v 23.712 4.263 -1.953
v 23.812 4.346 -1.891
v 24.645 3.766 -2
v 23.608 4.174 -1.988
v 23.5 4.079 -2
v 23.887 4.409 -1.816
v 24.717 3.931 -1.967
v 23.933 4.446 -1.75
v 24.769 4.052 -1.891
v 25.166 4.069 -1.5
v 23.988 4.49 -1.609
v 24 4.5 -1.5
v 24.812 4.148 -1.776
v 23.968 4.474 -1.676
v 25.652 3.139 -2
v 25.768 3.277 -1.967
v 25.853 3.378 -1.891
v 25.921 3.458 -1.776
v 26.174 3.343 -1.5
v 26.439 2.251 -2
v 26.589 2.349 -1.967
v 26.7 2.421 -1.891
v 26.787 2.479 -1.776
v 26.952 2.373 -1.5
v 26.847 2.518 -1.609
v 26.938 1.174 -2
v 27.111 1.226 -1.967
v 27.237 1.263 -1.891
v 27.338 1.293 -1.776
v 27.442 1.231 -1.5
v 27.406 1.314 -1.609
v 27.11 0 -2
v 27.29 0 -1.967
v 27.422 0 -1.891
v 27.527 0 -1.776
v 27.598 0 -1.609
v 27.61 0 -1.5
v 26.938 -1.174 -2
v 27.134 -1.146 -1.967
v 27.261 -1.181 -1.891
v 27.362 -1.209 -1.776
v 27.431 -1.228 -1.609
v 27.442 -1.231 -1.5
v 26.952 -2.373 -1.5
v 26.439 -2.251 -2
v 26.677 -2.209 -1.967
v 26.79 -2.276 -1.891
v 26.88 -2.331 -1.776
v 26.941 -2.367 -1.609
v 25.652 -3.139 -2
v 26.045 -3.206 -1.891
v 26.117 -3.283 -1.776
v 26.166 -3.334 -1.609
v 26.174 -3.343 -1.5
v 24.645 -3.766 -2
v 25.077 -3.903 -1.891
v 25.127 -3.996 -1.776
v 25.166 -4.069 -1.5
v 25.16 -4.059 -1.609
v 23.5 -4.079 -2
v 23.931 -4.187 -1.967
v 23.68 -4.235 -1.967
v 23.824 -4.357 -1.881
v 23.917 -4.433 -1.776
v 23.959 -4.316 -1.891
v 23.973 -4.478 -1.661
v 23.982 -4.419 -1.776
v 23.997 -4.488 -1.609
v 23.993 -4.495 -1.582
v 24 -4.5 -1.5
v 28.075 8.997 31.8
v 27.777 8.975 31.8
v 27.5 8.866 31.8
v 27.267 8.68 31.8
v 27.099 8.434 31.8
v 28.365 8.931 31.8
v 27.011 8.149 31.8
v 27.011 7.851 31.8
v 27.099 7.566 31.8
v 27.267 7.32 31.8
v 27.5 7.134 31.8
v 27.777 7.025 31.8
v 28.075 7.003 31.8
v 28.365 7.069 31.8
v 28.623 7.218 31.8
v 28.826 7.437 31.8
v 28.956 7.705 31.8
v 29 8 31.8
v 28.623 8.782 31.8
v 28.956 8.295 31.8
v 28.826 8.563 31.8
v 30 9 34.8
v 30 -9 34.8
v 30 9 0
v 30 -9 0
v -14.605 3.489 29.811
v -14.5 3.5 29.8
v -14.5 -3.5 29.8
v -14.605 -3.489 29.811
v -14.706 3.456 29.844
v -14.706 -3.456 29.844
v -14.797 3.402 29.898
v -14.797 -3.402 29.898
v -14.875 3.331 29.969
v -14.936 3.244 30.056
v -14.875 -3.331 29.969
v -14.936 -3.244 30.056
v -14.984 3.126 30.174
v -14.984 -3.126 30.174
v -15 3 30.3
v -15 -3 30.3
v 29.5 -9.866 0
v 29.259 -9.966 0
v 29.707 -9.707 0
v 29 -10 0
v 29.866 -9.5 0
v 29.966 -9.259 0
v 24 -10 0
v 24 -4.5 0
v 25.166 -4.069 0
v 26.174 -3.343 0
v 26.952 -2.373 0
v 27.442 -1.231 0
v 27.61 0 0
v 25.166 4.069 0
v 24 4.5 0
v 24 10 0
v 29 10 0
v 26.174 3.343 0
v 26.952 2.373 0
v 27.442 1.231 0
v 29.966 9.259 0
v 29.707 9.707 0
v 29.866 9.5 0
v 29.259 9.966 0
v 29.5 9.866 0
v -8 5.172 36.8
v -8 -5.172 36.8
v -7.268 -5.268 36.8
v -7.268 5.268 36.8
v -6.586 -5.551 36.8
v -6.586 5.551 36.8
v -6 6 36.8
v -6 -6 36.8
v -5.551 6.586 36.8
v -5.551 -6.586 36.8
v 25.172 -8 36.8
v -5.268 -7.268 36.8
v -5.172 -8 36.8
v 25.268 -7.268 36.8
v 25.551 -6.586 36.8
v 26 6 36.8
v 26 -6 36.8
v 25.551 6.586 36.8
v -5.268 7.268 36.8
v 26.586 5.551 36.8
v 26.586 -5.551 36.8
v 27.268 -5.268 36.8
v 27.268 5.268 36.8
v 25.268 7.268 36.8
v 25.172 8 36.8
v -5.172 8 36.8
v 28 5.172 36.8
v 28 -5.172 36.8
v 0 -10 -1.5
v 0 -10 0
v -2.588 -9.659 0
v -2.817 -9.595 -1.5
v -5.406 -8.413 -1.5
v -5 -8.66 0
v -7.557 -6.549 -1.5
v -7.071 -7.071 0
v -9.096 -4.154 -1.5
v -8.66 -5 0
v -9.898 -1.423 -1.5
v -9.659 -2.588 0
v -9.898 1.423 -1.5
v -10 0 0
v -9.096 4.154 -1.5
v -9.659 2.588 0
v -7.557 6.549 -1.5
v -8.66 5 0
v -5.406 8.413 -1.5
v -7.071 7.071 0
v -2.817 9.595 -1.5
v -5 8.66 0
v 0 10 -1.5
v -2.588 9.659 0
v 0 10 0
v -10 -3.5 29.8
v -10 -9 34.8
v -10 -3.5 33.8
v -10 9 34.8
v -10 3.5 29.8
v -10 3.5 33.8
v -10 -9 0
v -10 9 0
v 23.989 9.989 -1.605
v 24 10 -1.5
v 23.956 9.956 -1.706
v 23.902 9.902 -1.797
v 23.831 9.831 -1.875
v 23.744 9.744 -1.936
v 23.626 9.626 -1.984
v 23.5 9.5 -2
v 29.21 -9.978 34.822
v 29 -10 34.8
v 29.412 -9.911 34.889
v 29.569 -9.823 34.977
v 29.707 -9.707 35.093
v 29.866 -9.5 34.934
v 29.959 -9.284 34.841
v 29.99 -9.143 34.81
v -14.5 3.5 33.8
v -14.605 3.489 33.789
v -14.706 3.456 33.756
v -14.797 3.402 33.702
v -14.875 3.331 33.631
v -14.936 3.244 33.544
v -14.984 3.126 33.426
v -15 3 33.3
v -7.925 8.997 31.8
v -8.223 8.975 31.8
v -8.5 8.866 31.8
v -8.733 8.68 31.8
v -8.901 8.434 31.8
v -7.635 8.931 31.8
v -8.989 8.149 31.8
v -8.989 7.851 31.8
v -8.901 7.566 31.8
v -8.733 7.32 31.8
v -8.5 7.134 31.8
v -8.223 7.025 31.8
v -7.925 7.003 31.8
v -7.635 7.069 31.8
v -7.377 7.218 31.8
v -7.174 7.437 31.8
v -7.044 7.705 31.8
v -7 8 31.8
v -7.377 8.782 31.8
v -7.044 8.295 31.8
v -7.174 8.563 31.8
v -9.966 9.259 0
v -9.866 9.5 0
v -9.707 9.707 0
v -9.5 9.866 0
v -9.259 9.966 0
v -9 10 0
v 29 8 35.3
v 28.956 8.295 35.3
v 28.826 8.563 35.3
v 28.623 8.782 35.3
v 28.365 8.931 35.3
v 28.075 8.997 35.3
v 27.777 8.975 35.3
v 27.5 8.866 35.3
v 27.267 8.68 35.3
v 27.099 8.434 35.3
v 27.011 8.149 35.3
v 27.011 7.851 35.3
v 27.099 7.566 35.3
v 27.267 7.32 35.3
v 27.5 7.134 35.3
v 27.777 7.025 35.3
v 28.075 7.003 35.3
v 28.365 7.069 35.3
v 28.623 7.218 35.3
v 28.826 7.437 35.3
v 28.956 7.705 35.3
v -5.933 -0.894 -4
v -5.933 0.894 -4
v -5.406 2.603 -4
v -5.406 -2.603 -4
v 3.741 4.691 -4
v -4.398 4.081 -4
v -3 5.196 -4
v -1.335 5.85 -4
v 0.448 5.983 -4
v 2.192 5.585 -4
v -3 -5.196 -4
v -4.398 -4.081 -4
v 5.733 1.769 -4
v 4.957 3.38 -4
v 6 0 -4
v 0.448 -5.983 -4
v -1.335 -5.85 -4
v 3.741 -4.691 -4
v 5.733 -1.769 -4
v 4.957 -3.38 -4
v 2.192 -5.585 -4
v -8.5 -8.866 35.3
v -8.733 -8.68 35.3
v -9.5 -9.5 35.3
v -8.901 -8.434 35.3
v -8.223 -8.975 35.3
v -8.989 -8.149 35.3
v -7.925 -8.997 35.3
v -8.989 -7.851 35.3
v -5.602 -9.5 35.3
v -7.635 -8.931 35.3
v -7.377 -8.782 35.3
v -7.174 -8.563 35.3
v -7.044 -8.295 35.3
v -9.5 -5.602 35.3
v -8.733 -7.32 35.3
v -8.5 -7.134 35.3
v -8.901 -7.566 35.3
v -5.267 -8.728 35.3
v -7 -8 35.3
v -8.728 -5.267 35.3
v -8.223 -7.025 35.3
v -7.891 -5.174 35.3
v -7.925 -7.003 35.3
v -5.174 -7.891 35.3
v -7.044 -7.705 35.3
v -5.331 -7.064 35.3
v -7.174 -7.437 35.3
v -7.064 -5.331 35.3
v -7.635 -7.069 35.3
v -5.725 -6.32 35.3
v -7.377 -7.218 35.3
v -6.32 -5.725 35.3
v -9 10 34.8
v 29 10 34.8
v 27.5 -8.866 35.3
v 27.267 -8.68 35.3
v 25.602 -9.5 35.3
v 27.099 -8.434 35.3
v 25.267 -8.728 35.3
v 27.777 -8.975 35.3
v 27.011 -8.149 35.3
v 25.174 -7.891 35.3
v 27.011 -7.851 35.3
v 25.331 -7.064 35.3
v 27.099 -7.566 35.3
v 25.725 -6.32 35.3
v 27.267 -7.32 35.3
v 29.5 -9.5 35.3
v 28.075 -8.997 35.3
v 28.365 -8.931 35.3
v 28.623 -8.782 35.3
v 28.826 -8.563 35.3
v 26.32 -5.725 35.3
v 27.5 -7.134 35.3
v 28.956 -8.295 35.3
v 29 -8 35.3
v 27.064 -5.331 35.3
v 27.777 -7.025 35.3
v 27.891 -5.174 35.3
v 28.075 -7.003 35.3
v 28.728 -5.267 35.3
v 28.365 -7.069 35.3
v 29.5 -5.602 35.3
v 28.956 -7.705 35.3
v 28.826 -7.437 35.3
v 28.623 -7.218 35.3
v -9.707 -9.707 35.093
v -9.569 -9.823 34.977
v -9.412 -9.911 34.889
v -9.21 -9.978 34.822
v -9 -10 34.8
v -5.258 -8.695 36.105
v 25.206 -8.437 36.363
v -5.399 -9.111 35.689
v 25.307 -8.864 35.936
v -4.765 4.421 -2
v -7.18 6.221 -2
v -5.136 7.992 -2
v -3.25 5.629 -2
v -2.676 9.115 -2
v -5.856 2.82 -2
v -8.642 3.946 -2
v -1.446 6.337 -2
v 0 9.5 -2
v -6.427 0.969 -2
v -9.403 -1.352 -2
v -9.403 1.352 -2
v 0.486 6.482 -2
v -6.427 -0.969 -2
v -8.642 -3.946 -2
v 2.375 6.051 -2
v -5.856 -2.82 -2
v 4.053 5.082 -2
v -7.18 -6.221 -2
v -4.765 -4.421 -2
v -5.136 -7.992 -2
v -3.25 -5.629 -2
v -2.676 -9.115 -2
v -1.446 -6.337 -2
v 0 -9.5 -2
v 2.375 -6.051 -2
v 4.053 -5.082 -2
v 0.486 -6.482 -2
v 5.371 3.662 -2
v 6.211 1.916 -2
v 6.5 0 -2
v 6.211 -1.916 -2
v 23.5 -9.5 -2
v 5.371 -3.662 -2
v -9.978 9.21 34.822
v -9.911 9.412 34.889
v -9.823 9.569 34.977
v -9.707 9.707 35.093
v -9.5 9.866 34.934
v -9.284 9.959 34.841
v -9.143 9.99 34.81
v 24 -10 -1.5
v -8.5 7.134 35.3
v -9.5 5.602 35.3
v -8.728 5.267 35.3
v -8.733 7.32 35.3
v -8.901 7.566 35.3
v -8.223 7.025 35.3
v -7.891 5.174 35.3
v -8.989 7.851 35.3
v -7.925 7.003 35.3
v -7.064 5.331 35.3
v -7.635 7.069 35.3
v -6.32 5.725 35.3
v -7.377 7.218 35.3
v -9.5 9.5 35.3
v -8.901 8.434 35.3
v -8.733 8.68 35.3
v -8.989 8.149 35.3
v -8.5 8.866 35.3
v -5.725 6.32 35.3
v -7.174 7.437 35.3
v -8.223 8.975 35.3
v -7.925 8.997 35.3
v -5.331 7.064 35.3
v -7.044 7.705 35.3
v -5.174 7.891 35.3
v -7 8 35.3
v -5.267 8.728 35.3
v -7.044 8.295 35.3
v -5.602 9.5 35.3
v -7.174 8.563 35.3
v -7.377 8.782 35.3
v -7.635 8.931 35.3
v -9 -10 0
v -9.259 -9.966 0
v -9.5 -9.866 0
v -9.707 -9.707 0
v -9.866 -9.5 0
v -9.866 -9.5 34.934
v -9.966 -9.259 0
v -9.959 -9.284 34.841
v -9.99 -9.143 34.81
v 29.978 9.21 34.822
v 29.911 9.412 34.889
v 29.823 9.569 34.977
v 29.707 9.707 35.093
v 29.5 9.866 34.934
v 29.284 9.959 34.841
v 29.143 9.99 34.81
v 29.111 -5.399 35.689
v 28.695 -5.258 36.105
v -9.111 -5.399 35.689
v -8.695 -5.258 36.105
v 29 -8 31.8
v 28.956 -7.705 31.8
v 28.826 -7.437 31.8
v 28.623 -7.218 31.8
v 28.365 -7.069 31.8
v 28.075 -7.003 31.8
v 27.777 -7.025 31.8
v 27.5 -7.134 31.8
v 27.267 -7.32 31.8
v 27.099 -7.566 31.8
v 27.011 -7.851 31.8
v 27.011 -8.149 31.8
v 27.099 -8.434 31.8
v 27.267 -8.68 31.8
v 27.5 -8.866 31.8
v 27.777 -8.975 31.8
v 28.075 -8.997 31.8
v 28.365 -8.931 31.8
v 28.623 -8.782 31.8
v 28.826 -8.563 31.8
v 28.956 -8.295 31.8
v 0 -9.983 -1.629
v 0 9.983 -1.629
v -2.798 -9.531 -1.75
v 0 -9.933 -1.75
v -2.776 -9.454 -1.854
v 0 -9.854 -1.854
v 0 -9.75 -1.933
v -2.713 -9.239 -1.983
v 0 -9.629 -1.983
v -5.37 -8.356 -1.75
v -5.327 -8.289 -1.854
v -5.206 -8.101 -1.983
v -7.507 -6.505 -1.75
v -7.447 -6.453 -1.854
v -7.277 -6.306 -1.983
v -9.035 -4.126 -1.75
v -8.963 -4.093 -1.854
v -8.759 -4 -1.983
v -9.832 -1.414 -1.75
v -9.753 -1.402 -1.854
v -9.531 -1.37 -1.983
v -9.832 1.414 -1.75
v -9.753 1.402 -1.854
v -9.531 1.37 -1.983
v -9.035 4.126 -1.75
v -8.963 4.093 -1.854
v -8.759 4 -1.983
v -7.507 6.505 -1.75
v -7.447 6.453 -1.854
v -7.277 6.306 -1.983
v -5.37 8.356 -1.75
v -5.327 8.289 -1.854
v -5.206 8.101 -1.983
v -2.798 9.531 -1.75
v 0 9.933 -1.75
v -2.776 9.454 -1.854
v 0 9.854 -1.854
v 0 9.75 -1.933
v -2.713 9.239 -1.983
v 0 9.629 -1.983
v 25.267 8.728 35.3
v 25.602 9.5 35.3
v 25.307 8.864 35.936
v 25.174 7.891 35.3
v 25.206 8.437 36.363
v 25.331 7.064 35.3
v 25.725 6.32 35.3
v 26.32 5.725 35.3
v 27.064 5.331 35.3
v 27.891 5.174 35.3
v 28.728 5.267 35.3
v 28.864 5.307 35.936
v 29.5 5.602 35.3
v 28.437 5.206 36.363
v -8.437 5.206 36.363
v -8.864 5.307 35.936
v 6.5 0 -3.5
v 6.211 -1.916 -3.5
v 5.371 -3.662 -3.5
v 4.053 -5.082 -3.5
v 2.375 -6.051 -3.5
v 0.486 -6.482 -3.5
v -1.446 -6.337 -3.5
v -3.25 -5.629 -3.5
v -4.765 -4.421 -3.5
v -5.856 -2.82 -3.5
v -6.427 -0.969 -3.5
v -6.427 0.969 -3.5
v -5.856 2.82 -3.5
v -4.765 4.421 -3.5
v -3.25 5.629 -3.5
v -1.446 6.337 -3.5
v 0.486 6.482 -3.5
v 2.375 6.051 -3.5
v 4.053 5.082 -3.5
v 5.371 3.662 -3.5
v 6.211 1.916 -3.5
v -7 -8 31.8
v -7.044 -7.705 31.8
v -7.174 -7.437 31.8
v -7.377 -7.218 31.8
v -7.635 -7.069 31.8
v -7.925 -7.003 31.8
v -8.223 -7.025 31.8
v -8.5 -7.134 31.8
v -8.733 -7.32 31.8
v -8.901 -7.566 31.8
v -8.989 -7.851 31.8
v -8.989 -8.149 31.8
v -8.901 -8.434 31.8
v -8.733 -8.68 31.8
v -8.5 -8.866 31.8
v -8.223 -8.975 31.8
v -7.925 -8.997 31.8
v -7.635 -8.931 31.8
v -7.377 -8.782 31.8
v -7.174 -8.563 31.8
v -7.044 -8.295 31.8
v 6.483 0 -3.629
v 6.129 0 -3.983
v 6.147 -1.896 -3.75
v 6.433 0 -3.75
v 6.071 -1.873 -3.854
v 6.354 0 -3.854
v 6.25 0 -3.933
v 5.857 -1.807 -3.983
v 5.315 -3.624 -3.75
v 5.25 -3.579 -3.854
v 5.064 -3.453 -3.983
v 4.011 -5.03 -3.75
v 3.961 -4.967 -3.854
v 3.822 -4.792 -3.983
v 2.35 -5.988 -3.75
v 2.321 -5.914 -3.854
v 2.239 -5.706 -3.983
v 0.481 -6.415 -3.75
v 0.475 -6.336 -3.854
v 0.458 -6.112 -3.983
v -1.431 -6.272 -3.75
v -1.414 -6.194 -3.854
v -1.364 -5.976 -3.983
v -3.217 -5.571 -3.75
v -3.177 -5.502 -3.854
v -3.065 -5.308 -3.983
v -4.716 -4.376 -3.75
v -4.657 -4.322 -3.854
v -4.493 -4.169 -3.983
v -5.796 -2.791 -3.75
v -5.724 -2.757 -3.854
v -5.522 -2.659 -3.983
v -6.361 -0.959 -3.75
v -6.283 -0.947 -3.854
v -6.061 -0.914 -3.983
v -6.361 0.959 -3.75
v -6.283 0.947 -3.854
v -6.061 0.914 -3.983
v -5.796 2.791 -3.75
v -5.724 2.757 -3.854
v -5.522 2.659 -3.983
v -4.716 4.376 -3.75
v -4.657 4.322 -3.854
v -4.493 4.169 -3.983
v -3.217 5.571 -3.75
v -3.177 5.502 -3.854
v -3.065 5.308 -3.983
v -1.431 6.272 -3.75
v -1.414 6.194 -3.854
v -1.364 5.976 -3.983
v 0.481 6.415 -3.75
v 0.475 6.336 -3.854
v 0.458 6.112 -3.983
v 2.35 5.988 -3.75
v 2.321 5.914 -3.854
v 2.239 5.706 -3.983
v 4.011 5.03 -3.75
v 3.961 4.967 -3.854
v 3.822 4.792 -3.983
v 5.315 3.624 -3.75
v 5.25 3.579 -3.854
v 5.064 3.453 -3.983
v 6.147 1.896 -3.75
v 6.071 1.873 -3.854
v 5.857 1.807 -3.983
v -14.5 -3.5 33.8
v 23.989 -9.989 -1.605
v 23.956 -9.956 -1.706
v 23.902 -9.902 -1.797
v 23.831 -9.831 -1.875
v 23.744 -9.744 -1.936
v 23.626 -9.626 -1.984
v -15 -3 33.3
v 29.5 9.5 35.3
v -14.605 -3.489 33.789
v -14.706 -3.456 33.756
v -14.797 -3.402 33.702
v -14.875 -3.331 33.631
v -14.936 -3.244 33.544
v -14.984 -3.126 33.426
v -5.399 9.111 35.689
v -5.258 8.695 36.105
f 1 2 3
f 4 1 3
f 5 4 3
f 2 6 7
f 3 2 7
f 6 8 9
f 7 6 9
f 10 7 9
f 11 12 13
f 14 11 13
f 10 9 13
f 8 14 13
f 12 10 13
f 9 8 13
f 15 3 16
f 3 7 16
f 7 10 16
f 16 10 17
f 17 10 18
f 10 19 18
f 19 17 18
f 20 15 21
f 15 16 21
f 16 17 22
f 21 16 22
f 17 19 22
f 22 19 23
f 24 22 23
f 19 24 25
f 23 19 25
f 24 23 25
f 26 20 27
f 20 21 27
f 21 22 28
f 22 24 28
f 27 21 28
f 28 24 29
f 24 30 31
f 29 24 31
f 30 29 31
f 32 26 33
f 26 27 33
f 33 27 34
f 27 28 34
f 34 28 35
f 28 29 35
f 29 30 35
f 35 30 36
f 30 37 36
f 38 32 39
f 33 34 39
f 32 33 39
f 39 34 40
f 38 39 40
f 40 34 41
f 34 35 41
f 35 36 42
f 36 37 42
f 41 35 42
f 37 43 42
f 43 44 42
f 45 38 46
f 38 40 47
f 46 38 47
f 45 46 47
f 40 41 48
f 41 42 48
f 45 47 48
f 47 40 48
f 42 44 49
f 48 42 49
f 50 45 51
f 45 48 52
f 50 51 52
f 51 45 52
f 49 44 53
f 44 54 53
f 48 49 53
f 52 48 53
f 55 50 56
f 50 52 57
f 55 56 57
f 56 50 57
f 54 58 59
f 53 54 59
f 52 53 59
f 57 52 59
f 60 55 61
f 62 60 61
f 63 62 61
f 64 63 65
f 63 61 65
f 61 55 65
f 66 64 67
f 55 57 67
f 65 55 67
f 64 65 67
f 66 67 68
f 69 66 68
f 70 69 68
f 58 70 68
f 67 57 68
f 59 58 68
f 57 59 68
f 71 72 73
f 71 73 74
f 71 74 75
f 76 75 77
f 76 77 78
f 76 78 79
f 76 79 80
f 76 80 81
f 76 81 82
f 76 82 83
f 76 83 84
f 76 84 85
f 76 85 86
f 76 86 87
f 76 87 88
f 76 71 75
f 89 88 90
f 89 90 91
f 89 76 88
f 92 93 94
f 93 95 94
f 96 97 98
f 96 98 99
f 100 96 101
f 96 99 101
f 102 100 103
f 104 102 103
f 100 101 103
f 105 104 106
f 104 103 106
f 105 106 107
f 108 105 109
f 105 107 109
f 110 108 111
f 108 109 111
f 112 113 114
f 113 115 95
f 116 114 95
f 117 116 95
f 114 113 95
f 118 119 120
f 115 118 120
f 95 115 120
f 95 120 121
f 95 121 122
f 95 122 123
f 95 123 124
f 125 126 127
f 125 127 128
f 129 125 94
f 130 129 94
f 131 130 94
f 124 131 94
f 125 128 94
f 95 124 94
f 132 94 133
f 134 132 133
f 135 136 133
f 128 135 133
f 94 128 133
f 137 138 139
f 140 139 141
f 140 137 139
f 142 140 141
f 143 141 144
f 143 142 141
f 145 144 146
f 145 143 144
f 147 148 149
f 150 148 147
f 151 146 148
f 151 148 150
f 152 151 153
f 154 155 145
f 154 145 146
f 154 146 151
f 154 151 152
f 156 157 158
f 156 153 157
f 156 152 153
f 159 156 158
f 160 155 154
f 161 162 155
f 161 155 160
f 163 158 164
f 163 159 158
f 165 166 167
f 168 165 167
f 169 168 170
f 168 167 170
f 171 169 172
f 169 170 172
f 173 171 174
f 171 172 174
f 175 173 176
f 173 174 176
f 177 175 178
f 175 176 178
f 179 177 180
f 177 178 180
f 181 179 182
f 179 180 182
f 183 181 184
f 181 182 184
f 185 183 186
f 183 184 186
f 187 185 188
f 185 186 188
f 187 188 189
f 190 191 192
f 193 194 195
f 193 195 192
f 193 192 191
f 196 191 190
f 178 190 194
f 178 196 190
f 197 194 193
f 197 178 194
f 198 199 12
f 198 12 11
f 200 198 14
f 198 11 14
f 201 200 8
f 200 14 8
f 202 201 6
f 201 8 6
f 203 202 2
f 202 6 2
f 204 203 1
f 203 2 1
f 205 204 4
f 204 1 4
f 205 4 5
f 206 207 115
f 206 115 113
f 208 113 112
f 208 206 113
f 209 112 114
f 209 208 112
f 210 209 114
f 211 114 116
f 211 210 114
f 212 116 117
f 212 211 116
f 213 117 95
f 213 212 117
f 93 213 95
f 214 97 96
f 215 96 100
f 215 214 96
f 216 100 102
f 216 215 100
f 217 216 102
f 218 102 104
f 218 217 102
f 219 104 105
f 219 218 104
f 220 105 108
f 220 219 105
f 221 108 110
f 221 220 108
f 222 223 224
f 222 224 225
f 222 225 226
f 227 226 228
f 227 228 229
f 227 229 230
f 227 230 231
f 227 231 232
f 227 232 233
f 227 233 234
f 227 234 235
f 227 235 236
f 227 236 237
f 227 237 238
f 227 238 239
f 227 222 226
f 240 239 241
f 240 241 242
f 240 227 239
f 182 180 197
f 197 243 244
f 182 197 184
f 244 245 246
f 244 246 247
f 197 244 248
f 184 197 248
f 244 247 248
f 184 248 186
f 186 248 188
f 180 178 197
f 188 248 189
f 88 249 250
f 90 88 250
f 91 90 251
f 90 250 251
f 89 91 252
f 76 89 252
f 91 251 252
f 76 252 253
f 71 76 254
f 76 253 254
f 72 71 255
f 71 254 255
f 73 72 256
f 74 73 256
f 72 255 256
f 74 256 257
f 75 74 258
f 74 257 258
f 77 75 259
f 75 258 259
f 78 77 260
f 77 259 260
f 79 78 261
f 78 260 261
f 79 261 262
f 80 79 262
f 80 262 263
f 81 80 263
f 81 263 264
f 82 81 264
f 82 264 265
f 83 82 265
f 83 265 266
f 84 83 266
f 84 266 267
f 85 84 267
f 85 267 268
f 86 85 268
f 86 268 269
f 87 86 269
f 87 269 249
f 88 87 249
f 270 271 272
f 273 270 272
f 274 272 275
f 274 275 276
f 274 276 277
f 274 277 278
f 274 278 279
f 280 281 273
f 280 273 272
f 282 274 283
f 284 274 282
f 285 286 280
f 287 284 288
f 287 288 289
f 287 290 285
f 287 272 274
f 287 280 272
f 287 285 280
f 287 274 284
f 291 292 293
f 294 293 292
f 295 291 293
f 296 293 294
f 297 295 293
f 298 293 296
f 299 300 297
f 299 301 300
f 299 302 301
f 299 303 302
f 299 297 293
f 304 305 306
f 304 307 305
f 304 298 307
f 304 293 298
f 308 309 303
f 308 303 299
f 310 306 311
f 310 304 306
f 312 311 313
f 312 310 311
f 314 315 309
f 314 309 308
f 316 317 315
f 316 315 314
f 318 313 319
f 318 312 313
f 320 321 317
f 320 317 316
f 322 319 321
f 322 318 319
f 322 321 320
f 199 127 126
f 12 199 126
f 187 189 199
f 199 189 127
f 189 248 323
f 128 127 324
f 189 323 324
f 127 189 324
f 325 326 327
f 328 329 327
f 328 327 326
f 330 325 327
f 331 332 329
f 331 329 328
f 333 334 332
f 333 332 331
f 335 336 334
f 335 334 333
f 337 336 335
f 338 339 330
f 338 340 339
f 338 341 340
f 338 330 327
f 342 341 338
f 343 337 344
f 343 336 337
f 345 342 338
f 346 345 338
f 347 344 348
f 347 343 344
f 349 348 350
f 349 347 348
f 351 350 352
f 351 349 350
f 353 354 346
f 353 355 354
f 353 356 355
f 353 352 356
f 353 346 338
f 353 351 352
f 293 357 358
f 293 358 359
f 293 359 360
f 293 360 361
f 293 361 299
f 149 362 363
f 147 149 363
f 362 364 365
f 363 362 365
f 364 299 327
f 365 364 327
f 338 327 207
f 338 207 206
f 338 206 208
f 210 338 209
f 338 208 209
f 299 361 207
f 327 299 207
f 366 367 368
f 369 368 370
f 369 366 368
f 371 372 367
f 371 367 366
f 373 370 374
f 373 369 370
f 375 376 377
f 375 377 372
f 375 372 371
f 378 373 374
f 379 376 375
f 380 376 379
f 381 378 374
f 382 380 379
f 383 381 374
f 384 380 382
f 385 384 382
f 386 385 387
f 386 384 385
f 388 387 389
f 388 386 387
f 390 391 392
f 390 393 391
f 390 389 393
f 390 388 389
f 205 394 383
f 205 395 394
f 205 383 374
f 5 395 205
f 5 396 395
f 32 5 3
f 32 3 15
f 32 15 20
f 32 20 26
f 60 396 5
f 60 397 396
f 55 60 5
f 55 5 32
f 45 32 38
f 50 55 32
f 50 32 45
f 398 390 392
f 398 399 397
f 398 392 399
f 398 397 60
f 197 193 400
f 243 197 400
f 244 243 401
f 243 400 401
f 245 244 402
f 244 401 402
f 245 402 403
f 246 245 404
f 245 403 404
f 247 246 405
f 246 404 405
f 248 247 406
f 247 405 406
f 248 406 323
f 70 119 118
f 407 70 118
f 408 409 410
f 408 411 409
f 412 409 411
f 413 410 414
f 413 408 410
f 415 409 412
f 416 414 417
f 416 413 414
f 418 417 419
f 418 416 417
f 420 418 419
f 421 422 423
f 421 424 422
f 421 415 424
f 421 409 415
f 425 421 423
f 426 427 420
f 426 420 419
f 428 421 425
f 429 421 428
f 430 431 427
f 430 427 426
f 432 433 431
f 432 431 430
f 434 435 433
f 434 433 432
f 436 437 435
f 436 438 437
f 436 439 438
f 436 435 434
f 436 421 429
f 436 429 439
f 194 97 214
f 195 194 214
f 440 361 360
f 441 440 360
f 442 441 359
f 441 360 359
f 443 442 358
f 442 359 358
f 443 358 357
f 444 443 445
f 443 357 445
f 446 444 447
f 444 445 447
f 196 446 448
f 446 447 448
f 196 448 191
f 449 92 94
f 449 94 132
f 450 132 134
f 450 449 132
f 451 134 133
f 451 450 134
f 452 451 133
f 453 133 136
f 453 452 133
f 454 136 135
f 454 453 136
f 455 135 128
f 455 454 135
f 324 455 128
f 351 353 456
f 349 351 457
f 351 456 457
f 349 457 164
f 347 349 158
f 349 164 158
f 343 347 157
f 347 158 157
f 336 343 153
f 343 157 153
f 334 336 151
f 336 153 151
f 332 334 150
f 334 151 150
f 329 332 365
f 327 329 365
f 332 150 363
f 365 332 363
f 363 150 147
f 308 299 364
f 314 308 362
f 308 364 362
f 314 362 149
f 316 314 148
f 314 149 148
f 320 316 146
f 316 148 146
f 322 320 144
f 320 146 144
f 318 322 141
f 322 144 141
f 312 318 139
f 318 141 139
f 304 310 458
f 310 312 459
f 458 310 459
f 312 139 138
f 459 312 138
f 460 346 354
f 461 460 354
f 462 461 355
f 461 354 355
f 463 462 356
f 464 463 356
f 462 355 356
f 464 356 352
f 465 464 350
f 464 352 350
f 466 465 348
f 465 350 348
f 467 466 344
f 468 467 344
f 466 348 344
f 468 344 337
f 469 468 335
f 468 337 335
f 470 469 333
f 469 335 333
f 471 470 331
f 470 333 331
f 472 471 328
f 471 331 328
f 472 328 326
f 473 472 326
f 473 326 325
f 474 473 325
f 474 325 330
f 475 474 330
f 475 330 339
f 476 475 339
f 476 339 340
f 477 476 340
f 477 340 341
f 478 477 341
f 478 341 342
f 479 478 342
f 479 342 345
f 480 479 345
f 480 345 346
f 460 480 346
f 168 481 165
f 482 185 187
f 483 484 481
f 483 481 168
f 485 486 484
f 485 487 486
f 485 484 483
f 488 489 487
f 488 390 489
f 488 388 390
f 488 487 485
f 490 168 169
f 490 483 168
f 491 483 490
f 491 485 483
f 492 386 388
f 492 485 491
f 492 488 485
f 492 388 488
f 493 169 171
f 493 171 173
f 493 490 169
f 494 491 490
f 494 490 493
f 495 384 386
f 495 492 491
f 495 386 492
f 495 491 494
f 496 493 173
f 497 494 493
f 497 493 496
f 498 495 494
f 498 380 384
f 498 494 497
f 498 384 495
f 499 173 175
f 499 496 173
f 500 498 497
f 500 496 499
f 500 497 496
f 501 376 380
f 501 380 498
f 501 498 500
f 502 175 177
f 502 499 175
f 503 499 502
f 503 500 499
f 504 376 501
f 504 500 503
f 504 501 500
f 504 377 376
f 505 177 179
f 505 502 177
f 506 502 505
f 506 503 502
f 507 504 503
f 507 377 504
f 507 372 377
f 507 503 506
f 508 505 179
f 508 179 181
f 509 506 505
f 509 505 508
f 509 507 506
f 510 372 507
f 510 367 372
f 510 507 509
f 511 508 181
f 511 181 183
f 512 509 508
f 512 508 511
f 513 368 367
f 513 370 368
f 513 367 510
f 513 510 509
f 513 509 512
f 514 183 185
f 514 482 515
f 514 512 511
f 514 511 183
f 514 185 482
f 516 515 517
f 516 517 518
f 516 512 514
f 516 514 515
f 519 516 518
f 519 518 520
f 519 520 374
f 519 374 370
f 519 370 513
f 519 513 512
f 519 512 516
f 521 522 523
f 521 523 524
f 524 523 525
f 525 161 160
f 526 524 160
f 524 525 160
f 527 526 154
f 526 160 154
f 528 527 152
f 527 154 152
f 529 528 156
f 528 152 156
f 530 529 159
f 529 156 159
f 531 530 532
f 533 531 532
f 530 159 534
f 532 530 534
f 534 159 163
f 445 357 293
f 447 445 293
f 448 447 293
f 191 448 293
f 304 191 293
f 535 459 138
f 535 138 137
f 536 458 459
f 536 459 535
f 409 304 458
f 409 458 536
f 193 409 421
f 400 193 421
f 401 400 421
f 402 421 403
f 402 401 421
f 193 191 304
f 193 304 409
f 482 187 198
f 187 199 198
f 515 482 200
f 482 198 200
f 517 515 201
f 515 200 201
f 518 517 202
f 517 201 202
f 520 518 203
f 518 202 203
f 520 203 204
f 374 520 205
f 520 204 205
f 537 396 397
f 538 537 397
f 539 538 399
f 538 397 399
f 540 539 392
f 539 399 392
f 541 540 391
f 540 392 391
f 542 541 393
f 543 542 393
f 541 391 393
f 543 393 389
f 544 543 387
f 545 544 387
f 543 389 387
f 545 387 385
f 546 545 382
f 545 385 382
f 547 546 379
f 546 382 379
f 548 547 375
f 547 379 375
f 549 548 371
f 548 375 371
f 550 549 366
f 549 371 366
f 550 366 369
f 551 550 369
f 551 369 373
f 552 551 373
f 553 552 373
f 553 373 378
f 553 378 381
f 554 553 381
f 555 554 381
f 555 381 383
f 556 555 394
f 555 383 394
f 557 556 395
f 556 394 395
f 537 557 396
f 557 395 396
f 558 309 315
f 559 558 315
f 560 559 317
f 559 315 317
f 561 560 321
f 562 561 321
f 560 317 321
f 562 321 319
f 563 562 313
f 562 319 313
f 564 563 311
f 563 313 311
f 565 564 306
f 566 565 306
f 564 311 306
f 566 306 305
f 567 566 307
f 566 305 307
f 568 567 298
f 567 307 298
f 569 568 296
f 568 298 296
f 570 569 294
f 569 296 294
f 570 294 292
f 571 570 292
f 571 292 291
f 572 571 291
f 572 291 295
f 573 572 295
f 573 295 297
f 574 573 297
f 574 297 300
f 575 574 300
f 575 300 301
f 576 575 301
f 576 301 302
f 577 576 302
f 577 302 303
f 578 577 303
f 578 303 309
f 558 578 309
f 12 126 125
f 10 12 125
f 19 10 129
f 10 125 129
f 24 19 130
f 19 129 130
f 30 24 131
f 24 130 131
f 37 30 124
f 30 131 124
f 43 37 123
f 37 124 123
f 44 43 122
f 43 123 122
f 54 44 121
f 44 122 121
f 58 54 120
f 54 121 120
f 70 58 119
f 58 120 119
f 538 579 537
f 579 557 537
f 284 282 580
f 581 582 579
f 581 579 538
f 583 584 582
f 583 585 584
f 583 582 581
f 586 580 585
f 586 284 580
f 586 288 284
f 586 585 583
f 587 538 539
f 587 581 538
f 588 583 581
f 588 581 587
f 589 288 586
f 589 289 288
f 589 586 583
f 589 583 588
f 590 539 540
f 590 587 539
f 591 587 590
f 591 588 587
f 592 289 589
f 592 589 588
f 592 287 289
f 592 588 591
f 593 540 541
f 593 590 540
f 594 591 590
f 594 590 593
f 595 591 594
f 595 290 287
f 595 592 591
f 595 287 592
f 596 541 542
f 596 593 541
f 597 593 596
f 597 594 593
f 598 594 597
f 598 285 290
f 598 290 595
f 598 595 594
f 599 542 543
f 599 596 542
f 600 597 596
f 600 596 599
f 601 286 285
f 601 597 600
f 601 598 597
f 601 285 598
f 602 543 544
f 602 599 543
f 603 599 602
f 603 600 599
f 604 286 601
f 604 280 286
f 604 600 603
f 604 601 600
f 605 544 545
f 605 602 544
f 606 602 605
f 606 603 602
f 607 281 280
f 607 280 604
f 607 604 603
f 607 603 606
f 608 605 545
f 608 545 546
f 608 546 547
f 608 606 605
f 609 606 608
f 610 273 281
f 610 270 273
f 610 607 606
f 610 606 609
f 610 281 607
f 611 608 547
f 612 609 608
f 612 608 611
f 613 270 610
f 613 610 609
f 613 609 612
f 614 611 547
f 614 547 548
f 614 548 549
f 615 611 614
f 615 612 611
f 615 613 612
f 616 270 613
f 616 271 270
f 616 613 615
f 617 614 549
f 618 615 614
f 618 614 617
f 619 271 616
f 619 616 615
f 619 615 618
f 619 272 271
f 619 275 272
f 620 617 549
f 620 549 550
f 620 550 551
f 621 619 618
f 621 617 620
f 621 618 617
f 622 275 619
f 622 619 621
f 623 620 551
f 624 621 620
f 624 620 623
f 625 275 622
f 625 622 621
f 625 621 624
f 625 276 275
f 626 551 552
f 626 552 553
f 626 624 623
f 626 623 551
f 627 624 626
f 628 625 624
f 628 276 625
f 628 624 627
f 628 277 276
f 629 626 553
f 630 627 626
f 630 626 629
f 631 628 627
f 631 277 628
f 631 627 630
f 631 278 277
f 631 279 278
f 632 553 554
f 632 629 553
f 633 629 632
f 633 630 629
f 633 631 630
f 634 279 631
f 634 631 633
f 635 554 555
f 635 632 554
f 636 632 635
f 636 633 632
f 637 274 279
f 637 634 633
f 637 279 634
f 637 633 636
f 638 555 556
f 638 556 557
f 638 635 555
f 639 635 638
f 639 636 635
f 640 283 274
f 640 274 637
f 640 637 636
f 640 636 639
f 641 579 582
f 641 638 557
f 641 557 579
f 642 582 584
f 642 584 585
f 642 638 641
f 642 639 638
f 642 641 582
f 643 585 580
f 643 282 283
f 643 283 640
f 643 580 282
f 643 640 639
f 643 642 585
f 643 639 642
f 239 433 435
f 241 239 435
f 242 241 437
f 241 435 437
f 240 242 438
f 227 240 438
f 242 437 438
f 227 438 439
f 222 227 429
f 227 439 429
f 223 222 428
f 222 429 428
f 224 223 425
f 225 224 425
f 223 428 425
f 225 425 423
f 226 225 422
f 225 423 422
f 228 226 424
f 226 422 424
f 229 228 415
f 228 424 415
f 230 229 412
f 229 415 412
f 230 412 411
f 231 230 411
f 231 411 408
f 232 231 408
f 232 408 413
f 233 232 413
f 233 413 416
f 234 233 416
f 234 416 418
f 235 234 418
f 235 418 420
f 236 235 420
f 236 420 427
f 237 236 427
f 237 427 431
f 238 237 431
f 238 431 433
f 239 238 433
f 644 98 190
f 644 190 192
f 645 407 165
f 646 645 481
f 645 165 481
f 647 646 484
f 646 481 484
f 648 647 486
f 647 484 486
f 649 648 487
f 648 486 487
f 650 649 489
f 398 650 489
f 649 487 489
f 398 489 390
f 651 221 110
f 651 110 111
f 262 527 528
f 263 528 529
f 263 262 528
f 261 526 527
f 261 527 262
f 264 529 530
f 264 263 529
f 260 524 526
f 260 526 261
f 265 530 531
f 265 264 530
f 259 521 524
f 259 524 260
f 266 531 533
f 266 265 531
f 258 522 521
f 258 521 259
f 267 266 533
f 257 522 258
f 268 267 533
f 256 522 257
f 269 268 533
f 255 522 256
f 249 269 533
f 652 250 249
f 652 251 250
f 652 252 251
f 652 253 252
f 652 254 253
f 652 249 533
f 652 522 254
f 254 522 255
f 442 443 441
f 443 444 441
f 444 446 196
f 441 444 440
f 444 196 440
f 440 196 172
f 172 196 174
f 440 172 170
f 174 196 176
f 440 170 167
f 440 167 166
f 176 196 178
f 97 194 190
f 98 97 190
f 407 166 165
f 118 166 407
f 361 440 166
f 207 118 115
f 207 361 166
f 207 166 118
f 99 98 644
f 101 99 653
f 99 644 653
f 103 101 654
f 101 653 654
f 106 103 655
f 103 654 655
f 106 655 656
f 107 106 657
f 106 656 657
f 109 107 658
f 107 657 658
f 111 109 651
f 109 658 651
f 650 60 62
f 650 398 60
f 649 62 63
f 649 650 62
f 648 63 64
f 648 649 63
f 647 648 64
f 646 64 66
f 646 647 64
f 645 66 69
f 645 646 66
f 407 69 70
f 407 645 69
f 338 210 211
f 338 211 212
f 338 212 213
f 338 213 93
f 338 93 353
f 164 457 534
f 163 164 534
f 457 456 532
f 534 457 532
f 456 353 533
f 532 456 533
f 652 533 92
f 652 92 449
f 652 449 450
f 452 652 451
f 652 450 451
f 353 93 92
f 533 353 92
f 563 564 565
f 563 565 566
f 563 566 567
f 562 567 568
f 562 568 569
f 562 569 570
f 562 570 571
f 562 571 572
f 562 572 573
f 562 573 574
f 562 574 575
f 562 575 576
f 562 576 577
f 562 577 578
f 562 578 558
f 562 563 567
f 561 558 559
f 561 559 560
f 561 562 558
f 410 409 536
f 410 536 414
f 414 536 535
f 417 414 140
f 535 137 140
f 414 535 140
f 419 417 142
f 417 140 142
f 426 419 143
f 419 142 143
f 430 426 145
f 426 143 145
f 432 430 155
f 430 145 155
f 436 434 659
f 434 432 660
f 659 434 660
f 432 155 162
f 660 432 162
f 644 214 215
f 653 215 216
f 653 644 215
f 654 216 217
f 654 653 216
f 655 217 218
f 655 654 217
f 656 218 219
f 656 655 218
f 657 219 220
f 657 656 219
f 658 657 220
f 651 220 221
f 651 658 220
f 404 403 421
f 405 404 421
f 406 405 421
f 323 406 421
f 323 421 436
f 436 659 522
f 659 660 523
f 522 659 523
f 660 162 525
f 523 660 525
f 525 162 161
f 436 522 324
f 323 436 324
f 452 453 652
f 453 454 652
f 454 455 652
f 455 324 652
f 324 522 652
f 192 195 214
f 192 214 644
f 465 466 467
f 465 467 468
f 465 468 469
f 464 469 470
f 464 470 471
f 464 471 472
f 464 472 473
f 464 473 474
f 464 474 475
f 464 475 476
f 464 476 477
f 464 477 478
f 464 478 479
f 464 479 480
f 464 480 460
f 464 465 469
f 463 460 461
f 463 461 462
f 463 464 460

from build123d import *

# Parameters (mm, degrees)
SKETCH_W        = 40
SKETCH_H        = 20
PAD_DEPTH       = 36.8
CHAMFER_SIZE    = 2
CHAMFER001_SIZE = 2
CHAMFER002_SIZE = 2
CHAMFER003_SIZE = 2
SKETCH001_R     = 2.828427
POCKET_DEPTH    = 1.5
SKETCH002_R     = 1
POCKET001_DEPTH = 5
SKETCH003_R     = 10
PAD001_DEPTH    = 2
SKETCH004_W     = 24
SKETCH004_H     = 20
PAD002_DEPTH    = 2
PAD003_DEPTH    = 2
FILLET_R        = 1
FILLET001_R     = 1
FILLET002_R     = 1
FILLET003_R     = 1
FILLET004_R     = 0.5
SKETCH006_R     = 6.5
PAD004_DEPTH    = 2
FILLET005_R     = 0.5
SKETCH007_W     = 7
SKETCH007_H     = 4
PAD005_DEPTH    = 5
FILLET006_R     = 0.5


with BuildPart() as part:
    # Sketch → Pad (new body)
    with BuildSketch(Plane.XY):
        with Locations((10, 0)):
            Rectangle(SKETCH_W, SKETCH_H)
    extrude(amount=PAD_DEPTH)

    # Chamfer
    chamfer_edges = [part.edges().sort_by_distance(p)[0] for p in [
        (10, 10, 36.8),
    ]]
    chamfer(chamfer_edges, length=CHAMFER_SIZE)

    # Chamfer001
    chamfer001_edges = [part.edges().sort_by_distance(p)[0] for p in [
        (10, -10, 36.8),
    ]]
    chamfer(chamfer001_edges, length=CHAMFER001_SIZE)

    # Chamfer002
    chamfer002_edges = [part.edges().sort_by_distance(p)[0] for p in [
        (30, 0, 36.8),
    ]]
    chamfer(chamfer002_edges, length=CHAMFER002_SIZE)

    # Chamfer003
    chamfer003_edges = [part.edges().sort_by_distance(p)[0] for p in [
        (-10, 0, 36.8),
    ]]
    chamfer(chamfer003_edges, length=CHAMFER003_SIZE)

    # Sketch001 (on Face1 of Chamfer003) → Pocket (cut)
    with BuildSketch(Plane.XY.offset(36.8)):
        with Locations((-8, 8)):
            Circle(SKETCH001_R)
        with Locations((28, 8)):
            Circle(SKETCH001_R)
        with Locations((28, -8)):
            Circle(SKETCH001_R)
        with Locations((-8, -8)):
            Circle(SKETCH001_R)
    extrude(amount=-POCKET_DEPTH, mode=Mode.SUBTRACT)

    # Sketch002 (on Face1 of Pocket) → Pocket001 (cut)
    with BuildSketch(Plane.XY.offset(36.8)):
        with Locations((-8, 8)):
            Circle(SKETCH002_R)
        with Locations((28, 8)):
            Circle(SKETCH002_R)
        with Locations((-8, -8)):
            Circle(SKETCH002_R)
        with Locations((28, -8)):
            Circle(SKETCH002_R)
    extrude(amount=-POCKET001_DEPTH, mode=Mode.SUBTRACT)

    # Sketch003 (on Face21 of Pocket001) → Pad001 (join)
    with BuildSketch(Plane(origin=(0, 0, 0), x_dir=(1, 0, 0), z_dir=(0, 0, -1))):
        Circle(SKETCH003_R)
    extrude(amount=PAD001_DEPTH)

    # Sketch004 (on Face21 of Pad001) → Pad002 (join)
    with BuildSketch(Plane(origin=(0, 0, 0), x_dir=(1, 0, 0), z_dir=(0, 0, -1))):
        with Locations((12, 0)):
            Rectangle(SKETCH004_W, SKETCH004_H)
    extrude(amount=PAD002_DEPTH)

    # Sketch005 (on Face17 of Pad002) → Pad003 (join)
    with BuildSketch(Plane(origin=(0, 0, 0), x_dir=(1, 0, 0), z_dir=(0, 0, -1))):
        with BuildLine():
            ThreePointArc((24, -4.5), (27.609772, 0), (24, 4.5))
            Line((24, 4.5), (24, -4.5))
        make_face()
    extrude(amount=PAD003_DEPTH)

    # Fillet
    fillet_edges = [part.edges().sort_by_distance(p)[0] for p in [
        (30, -10, 17.4),
    ]]
    fillet(fillet_edges, radius=FILLET_R)

    # Fillet001
    fillet001_edges = [part.edges().sort_by_distance(p)[0] for p in [
        (30, 10, 17.4),
    ]]
    fillet(fillet001_edges, radius=FILLET001_R)

    # Fillet002
    fillet002_edges = [part.edges().sort_by_distance(p)[0] for p in [
        (-10, -10, 17.4),
    ]]
    fillet(fillet002_edges, radius=FILLET002_R)

    # Fillet003
    fillet003_edges = [part.edges().sort_by_distance(p)[0] for p in [
        (-10, 10, 17.4),
    ]]
    fillet(fillet003_edges, radius=FILLET003_R)

    # Fillet004
    fillet004_edges = [part.edges().sort_by_distance(p)[0] for p in [
        (12, 10, -2),
        (24, 7.25, -2),
        (27.609772, 0, -2),
        (24, -7.25, -2),
        (12, -10, -2),
        (-10, 0, -2),
    ]]
    fillet(fillet004_edges, radius=FILLET004_R)

    # Sketch006 (on Face14 of Fillet004) → Pad004 (join)
    with BuildSketch(Plane(origin=(0, 0, -2), x_dir=(1, 0, 0), z_dir=(0, 0, -1))):
        Circle(SKETCH006_R)
    extrude(amount=PAD004_DEPTH)

    # Fillet005
    fillet005_edges = [part.edges().sort_by_distance(p)[0] for p in [
        (-6.5, 0, -4),
    ]]
    fillet(fillet005_edges, radius=FILLET005_R)

    # Sketch007 (on Face26 of Fillet005) → Pad005 (join)
    with BuildSketch(Plane(origin=(-10, 0, 0), x_dir=(0, -1, 0), z_dir=(-1, 0, 0))):
        with Locations((0, 31.8)):
            Rectangle(SKETCH007_W, SKETCH007_H)
    extrude(amount=PAD005_DEPTH)

    # Fillet006
    fillet006_edges = [part.edges().sort_by_distance(p)[0] for p in [
        (-15, 0, 33.8),
        (-15, -3.5, 31.8),
        (-15, 0, 29.8),
        (-15, 3.5, 31.8),
    ]]
    fillet(fillet006_edges, radius=FILLET006_R)


solid = part.part
